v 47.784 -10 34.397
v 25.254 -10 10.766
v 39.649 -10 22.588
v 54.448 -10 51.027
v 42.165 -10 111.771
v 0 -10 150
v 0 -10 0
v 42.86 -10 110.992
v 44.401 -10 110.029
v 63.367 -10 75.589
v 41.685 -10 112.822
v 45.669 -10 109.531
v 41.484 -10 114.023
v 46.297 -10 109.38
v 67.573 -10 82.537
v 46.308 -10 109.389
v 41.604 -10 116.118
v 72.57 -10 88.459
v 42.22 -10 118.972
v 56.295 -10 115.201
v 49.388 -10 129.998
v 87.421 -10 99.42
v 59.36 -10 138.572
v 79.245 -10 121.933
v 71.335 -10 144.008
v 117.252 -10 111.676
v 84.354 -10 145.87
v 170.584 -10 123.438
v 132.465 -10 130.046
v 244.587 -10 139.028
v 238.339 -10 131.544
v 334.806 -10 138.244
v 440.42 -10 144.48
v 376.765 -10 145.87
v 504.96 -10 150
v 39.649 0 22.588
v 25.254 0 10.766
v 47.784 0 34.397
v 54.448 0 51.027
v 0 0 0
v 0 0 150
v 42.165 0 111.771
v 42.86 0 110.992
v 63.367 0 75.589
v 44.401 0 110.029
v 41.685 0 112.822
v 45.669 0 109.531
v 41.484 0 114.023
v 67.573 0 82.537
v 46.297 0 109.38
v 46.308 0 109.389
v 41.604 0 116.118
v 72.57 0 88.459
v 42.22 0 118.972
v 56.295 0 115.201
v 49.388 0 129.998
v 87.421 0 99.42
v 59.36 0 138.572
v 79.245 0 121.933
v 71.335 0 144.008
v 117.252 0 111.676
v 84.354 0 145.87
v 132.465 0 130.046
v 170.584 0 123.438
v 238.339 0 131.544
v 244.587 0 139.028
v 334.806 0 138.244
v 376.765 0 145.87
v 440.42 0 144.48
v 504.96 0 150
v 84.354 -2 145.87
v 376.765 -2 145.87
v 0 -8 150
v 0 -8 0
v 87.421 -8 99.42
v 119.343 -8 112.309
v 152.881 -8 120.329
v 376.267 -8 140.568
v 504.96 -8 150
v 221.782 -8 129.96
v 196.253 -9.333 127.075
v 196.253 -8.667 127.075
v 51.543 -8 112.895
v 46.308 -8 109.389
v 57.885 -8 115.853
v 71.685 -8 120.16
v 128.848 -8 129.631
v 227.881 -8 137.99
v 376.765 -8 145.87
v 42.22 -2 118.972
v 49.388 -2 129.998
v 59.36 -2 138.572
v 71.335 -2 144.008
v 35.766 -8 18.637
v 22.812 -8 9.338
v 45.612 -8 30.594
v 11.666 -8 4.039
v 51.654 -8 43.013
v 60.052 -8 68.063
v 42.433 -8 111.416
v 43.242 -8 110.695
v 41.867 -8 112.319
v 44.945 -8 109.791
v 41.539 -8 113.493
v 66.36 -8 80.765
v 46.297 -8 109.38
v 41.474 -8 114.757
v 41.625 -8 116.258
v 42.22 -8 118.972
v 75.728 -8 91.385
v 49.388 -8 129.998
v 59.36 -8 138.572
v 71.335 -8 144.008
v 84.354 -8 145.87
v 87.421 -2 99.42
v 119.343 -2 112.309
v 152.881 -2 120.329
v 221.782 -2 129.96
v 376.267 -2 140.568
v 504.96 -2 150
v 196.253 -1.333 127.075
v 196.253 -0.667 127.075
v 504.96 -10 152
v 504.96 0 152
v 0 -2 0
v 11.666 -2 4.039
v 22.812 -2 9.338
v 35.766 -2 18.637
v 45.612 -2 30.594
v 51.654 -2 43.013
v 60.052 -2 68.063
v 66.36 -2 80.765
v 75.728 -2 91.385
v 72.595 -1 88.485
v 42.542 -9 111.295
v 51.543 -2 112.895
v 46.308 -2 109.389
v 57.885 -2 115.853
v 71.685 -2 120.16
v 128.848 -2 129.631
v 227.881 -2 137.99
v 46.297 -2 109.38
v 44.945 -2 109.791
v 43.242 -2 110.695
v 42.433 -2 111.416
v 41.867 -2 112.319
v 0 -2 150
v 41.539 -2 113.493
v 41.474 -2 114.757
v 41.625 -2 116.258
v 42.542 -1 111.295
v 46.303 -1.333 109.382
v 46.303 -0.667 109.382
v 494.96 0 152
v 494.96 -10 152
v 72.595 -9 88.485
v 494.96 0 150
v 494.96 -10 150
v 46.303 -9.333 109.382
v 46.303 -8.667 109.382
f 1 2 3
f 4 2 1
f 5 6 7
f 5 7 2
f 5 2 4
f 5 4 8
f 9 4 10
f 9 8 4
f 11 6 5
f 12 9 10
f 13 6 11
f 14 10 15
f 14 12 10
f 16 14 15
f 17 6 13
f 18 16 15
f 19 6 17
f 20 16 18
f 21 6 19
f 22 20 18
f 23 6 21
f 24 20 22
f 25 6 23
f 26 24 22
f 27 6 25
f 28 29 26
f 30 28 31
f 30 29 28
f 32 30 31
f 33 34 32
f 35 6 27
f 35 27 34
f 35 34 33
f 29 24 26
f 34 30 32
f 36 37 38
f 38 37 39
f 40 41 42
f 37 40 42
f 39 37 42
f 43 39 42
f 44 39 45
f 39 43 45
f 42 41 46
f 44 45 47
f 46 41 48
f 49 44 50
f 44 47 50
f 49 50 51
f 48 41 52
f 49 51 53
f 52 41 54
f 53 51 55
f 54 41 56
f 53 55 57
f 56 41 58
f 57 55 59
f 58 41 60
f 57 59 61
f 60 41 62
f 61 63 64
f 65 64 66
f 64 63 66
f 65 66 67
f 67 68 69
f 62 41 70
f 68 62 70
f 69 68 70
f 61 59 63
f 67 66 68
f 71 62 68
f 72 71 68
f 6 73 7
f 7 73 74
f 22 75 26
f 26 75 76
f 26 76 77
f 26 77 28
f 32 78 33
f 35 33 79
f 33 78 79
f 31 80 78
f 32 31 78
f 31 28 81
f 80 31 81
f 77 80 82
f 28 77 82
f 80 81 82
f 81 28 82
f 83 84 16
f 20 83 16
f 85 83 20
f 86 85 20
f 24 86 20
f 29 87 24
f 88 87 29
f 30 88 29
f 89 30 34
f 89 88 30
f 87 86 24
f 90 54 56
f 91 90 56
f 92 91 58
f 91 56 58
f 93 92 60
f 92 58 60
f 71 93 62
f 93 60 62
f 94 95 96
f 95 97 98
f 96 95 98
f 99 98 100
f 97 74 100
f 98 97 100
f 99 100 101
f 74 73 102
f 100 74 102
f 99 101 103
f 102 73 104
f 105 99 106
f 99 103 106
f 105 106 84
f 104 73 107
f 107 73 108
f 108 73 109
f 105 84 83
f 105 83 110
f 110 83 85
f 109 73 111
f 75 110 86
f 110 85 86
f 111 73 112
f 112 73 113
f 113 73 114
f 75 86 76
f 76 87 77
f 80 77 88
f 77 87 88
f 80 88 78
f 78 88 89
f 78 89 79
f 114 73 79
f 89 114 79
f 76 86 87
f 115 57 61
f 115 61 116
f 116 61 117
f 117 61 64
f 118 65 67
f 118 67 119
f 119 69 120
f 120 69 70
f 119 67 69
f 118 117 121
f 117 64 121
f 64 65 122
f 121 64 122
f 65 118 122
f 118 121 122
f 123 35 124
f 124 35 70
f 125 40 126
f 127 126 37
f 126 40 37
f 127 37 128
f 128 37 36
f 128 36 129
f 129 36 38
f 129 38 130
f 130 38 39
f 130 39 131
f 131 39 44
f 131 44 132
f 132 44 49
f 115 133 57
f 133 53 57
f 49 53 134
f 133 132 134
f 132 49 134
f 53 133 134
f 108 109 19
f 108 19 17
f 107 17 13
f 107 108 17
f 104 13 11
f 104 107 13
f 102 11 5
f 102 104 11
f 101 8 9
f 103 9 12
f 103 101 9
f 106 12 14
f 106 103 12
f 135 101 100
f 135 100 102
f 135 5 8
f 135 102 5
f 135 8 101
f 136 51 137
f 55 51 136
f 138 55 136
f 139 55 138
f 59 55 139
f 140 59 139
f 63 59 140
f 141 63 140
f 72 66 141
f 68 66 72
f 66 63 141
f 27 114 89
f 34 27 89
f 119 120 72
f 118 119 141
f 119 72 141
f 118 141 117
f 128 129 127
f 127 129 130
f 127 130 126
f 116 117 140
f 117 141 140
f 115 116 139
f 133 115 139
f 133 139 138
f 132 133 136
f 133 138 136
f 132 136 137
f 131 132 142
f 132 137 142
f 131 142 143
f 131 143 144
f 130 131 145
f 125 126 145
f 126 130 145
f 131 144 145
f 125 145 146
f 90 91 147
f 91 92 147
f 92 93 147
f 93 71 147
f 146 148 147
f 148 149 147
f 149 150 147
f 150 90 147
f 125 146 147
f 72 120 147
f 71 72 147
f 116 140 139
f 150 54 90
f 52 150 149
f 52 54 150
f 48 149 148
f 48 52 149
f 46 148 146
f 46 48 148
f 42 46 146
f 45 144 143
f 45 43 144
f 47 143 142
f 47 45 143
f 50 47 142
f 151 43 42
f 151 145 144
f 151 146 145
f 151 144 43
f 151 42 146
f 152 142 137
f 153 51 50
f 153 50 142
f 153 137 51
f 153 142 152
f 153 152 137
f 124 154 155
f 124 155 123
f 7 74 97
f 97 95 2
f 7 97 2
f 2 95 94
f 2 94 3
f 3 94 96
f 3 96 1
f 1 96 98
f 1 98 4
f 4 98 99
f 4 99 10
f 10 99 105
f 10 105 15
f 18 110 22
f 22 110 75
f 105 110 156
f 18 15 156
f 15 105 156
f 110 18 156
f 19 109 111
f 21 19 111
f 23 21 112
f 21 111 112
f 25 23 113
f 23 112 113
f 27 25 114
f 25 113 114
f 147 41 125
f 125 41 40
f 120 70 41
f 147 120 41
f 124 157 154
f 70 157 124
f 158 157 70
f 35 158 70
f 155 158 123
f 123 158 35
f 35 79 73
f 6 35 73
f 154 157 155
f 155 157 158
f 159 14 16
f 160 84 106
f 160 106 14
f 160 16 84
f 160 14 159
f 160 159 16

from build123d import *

# Parameters (mm, degrees)
F1_DEPTH = 10
F2_W     = 10
F2_H     = 6
F2_H_2   = 2
F3_DEPTH = 2
F2_W_2   = 494.9598616024
F4_DEPTH = 150.0010001


with BuildPart() as f1:
    # F0 (on Front) → F1 (new body)
    with BuildSketch(Plane.XZ):
        with BuildLine():
            Line((37.9044083604, 150), (0, 150))
            Line((0, 150), (0, 0))
            add(Edge.make_bspline(
                [(0, 0), (65.9548709809, 19.5921129568), (43.1213805036, 68.0755041216), (81.5244080495, 96.0947031217), (87.4206218721, 99.4202668856)],
                knots=[0, 0, 0, 0, 0.3385952036, 0.3890383434, 0.3890383434, 0.3890383434, 0.3890383434], degree=3))
            Line((87.4206218721, 99.4202668856), (37.9044083604, 99.4202668856))
            Line((37.9044083604, 99.4202668856), (37.9044083604, 150))
        make_face()
        with BuildLine():
            Line((504.9598616024, 150), (37.9044083604, 150))
            Line((37.9044083604, 150), (37.9044083604, 99.4202668856))
            Line((37.9044083604, 99.4202668856), (87.4206218721, 99.4202668856))
            add(Edge.make_bspline(
                [(87.4206218721, 99.4202668856), (158.8349029243, 139.6991225106), (364.7468882992, 134.8777226964), (504.9598616024, 150)],
                knots=[0.3890383434, 0.3890383434, 0.3890383434, 0.3890383434, 1, 1, 1, 1], degree=3))
        make_face()
        with BuildLine():
            add(Edge.make_bspline(
                [(37.9044083604, 99.4202668856), (40.1391890242, 102.808774449), (42.3662939341, 106.1864082233), (46.2967331171, 109.3798892374)],
                knots=[0, 0, 0, 0, 0.1315547467, 0.1315547467, 0.1315547467, 0.1315547467], degree=3))
            ThreePointArc((37.9044083604, 99.4202668856), (38.9960657633, 109.4313669005), (42.2197256275, 118.9719044364))
            ThreePointArc((42.2197256275, 118.9719044364), (59.3599813963, 138.5720081749), (84.3538892703, 145.8697477955))
            Line((84.3538892703, 145.8697477955), (376.7651616806, 145.8697477955))
            add(Edge.make_bspline(
                [(46.3079142071, 109.3889696428), (48.8136397524, 111.4229766396), (81.946033288, 131.7241322969), (236.8391321907, 139.1866338489), (376.7651616806, 145.8697477955)],
                knots=[0.131679442, 0.131679442, 0.131679442, 0.131679442, 0.2154790768, 1, 1, 1, 1], degree=3))
            add(Edge.make_bspline(
                [(46.2967331171, 109.3798892374), (46.3055893224, 109.3814463555), (46.3067854724, 109.3853258877), (46.3079142071, 109.3889696428)],
                knots=[0.9757300046, 0.9757300046, 0.9757300046, 0.9757300046, 1, 1, 1, 1], degree=3))
        make_face(mode=Mode.SUBTRACT)
        with BuildLine():
            ThreePointArc((42.2197256275, 118.9719044364), (38.9960657633, 109.4313669005), (37.9044083604, 99.4202668856))
            add(Edge.make_bspline(
                [(37.9044083604, 99.4202668856), (40.1391890242, 102.808774449), (42.3662939341, 106.1864082233), (46.2967331171, 109.3798892374)],
                knots=[0, 0, 0, 0, 0.1315547467, 0.1315547467, 0.1315547467, 0.1315547467], degree=3))
            add(Edge.make_bspline(
                [(42.2197256275, 118.9719044364), (41.4295743237, 115.9331579648), (40.5211265672, 110.8878487784), (46.1452352099, 109.3532525312), (46.2967331171, 109.3798892374)],
                knots=[0, 0, 0, 0, 0.5605574336, 0.9757300046, 0.9757300046, 0.9757300046, 0.9757300046], degree=3))
        make_face()
    extrude(amount=F1_DEPTH)

    # F2 (on face) → F4 (cut, through all)
    with BuildSketch(Plane.XY.offset(150)):
        with Locations((247.4799308012, -5)):
            Rectangle(F2_W_2, F2_H)
        with Locations((499.9598616024, -5)):
            Rectangle(F2_W, F2_H)
    extrude(amount=-F4_DEPTH, mode=Mode.SUBTRACT)


with BuildPart() as f3:
    # F2 (on face) → F3 (new body)
    with BuildSketch(Plane.XY.offset(150)):
        with Locations((499.9598616024, -5)):
            Rectangle(F2_W, F2_H)
        with Locations((499.9598616024, -1)):
            Rectangle(F2_W, F2_H_2)
        with Locations((499.9598616024, -9)):
            Rectangle(F2_W, F2_H_2)
    extrude(amount=F3_DEPTH)


solid = Compound([f1.part, f3.part])
